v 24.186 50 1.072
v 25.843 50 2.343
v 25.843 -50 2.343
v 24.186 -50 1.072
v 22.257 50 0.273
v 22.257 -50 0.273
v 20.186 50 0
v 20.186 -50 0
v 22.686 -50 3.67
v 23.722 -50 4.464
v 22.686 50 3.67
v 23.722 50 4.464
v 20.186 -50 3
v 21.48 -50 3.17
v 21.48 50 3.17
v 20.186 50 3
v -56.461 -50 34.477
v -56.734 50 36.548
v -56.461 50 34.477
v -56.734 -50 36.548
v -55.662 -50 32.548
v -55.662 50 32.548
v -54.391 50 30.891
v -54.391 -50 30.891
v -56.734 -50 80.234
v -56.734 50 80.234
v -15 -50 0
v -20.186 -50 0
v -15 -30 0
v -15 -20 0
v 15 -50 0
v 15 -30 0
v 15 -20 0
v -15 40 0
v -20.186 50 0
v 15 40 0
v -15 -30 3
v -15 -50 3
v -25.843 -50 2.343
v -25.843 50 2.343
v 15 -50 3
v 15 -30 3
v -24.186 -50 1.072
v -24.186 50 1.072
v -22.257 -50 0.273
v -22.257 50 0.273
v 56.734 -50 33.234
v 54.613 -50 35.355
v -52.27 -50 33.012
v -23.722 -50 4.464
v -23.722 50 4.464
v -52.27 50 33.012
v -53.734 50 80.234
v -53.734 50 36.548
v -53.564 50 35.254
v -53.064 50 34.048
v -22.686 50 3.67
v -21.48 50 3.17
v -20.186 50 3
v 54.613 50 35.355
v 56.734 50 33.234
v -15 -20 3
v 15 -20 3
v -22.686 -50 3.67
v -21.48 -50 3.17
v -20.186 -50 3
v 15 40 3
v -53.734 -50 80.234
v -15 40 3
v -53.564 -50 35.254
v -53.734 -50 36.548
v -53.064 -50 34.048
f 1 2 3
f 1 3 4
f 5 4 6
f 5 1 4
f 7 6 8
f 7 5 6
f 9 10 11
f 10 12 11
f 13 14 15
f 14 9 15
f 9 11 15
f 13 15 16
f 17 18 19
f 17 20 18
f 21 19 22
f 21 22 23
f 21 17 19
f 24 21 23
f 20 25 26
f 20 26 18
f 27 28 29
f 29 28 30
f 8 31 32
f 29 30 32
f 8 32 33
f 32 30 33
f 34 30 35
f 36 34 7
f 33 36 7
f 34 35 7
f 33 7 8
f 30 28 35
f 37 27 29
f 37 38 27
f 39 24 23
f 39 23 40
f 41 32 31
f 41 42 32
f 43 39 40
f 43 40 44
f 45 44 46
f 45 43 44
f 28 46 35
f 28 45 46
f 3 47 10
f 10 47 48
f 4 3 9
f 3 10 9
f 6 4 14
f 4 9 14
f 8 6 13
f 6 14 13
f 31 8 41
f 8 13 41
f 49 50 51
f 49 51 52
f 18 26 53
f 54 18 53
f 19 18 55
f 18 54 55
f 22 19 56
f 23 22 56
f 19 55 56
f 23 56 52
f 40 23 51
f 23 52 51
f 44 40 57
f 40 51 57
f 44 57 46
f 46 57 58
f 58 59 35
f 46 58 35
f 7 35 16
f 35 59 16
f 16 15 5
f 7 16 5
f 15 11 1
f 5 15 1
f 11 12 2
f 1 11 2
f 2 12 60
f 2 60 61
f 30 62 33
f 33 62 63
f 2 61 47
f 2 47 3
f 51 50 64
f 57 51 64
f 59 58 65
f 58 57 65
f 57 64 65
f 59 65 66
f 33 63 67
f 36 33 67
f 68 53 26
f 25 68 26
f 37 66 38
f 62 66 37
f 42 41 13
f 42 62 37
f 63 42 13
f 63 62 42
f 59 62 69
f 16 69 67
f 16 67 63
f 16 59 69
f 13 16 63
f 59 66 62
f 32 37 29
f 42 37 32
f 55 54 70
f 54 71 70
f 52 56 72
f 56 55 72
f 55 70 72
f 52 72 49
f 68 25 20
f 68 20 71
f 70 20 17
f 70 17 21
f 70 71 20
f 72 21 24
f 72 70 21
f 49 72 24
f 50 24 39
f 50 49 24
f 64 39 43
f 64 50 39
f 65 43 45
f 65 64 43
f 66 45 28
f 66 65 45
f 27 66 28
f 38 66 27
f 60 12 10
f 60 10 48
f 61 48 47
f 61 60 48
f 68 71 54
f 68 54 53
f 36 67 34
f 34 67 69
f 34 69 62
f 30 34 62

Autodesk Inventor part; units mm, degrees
ref_plane "YZ Plane" through (0, 0, 0) normal (1, 0, 0) x (0, 1, 0)
ref_plane "XZ Plane" through (0, 0, 0) normal (0, 1, 0) x (-1, 0, 0)
ref_plane "XY Plane" through (0, 0, 0) normal (0, 0, 1) x (1, 0, 0)
sketch "Sketch1" plane through (0, 0, 0) normal (0, 0, 1) x (1, 0, 0)
  line L0 (-23.5, -50) -> (23.5, -50)
  line L1 (23.5, -50) -> (23.5, 50)
  line L2 (23.5, 50) -> (-23.5, 50)
  line L3 (-23.5, 50) -> (-23.5, -50)
  line L4 (-23.5, -50) -> (23.5, 50) construction
  line L5 (23.5, -50) -> (-23.5, 50) construction
  point P0 (0, 0)
  dimension "d154" = 47
  dimension "d155" = 100
extrude "Plate3" add sketch "Sketch1" along normal blind 3
sketch "Sketch7" plane through (21.3787, 50, 2.1213) normal (0.7071068, 0, -0.7071068) x (0, 1, 0)
  line L0 (-100, 0) -> (0, 0)
  line L1 (0, 0) -> (0, 47)
  line L2 (0, 47) -> (-100, 47)
  line L3 (-100, 47) -> (-100, 0)
edge flange "Flange3" height 47 angle 45 thickness 3 bend radius 5 thickness toward (0.7071068, 0, -0.7071068) relief round relief width 3 relief depth 1.5 corner gap 5 corner form 0 edges at (23.5, 0, 3) (-23.5, 0, 3) wall of the first edge with corners at (21.3787, -50, 2.1213) (21.3787, 50, 2.1213) (54.6127, 50, 35.3553) (54.6127, -50, 35.3553)
bend "Bend3"
corner "Corner3"
sketch "Sketch8" plane through (0, 0, 3) normal (0, 0, 1) x (1, 0, 0)
  line L0 (15, 40) -> (-15, 40)
  line L1 (-15, 40) -> (-15, -20)
  line L2 (-15, -20) -> (15, -20)
  line L3 (15, -20) -> (15, 40)
  line L4 (15, 40) -> (-15, -20) construction
  line L5 (-15, 40) -> (15, -20) construction
  line L6 (-23.5, 50) -> (20.1863, 50) projected
  line L7 (-20.1863, -50) -> (20.1863, -50) projected
  line L8 (15, -50) -> (-15, -50)
  line L9 (-15, -50) -> (-15, -30)
  line L10 (-15, -30) -> (15, -30)
  line L11 (15, -30) -> (15, -50)
  point P0 (0, 0)
  point P1 (0, 10)
  point P2 (-15, -50)
  dimension "d166" = 30
  dimension "d168" = 10
  dimension "d182" = 10
  dimension "d183" = 20
extrude "Cut1" cut sketch "Sketch8" against normal blind 3
sketch "Sketch9" plane through (-53.734, -50, 33.234) normal (-1, 0, 0) x (0, -1, 0)
  line L0 (-100, 0) -> (0, 0)
  line L1 (0, 0) -> (0, 47)
  line L2 (0, 47) -> (-100, 47)
  line L3 (-100, 47) -> (-100, 0)
edge flange "Flange4" height 47 angle 45 thickness 3 bend radius 5 thickness toward (-1, 0, 0) relief round relief width 3 relief depth 1.5 edges at (-54.6127, 0, 35.3553) wall of the first edge with corners at (-53.734, 50, 33.234) (-53.734, -50, 33.234) (-53.734, -50, 80.234) (-53.734, 50, 80.234)
bend "Bend4"
corner "Corner4"
properties part number "DSB-101 Axis" material "Stainless Steel"
